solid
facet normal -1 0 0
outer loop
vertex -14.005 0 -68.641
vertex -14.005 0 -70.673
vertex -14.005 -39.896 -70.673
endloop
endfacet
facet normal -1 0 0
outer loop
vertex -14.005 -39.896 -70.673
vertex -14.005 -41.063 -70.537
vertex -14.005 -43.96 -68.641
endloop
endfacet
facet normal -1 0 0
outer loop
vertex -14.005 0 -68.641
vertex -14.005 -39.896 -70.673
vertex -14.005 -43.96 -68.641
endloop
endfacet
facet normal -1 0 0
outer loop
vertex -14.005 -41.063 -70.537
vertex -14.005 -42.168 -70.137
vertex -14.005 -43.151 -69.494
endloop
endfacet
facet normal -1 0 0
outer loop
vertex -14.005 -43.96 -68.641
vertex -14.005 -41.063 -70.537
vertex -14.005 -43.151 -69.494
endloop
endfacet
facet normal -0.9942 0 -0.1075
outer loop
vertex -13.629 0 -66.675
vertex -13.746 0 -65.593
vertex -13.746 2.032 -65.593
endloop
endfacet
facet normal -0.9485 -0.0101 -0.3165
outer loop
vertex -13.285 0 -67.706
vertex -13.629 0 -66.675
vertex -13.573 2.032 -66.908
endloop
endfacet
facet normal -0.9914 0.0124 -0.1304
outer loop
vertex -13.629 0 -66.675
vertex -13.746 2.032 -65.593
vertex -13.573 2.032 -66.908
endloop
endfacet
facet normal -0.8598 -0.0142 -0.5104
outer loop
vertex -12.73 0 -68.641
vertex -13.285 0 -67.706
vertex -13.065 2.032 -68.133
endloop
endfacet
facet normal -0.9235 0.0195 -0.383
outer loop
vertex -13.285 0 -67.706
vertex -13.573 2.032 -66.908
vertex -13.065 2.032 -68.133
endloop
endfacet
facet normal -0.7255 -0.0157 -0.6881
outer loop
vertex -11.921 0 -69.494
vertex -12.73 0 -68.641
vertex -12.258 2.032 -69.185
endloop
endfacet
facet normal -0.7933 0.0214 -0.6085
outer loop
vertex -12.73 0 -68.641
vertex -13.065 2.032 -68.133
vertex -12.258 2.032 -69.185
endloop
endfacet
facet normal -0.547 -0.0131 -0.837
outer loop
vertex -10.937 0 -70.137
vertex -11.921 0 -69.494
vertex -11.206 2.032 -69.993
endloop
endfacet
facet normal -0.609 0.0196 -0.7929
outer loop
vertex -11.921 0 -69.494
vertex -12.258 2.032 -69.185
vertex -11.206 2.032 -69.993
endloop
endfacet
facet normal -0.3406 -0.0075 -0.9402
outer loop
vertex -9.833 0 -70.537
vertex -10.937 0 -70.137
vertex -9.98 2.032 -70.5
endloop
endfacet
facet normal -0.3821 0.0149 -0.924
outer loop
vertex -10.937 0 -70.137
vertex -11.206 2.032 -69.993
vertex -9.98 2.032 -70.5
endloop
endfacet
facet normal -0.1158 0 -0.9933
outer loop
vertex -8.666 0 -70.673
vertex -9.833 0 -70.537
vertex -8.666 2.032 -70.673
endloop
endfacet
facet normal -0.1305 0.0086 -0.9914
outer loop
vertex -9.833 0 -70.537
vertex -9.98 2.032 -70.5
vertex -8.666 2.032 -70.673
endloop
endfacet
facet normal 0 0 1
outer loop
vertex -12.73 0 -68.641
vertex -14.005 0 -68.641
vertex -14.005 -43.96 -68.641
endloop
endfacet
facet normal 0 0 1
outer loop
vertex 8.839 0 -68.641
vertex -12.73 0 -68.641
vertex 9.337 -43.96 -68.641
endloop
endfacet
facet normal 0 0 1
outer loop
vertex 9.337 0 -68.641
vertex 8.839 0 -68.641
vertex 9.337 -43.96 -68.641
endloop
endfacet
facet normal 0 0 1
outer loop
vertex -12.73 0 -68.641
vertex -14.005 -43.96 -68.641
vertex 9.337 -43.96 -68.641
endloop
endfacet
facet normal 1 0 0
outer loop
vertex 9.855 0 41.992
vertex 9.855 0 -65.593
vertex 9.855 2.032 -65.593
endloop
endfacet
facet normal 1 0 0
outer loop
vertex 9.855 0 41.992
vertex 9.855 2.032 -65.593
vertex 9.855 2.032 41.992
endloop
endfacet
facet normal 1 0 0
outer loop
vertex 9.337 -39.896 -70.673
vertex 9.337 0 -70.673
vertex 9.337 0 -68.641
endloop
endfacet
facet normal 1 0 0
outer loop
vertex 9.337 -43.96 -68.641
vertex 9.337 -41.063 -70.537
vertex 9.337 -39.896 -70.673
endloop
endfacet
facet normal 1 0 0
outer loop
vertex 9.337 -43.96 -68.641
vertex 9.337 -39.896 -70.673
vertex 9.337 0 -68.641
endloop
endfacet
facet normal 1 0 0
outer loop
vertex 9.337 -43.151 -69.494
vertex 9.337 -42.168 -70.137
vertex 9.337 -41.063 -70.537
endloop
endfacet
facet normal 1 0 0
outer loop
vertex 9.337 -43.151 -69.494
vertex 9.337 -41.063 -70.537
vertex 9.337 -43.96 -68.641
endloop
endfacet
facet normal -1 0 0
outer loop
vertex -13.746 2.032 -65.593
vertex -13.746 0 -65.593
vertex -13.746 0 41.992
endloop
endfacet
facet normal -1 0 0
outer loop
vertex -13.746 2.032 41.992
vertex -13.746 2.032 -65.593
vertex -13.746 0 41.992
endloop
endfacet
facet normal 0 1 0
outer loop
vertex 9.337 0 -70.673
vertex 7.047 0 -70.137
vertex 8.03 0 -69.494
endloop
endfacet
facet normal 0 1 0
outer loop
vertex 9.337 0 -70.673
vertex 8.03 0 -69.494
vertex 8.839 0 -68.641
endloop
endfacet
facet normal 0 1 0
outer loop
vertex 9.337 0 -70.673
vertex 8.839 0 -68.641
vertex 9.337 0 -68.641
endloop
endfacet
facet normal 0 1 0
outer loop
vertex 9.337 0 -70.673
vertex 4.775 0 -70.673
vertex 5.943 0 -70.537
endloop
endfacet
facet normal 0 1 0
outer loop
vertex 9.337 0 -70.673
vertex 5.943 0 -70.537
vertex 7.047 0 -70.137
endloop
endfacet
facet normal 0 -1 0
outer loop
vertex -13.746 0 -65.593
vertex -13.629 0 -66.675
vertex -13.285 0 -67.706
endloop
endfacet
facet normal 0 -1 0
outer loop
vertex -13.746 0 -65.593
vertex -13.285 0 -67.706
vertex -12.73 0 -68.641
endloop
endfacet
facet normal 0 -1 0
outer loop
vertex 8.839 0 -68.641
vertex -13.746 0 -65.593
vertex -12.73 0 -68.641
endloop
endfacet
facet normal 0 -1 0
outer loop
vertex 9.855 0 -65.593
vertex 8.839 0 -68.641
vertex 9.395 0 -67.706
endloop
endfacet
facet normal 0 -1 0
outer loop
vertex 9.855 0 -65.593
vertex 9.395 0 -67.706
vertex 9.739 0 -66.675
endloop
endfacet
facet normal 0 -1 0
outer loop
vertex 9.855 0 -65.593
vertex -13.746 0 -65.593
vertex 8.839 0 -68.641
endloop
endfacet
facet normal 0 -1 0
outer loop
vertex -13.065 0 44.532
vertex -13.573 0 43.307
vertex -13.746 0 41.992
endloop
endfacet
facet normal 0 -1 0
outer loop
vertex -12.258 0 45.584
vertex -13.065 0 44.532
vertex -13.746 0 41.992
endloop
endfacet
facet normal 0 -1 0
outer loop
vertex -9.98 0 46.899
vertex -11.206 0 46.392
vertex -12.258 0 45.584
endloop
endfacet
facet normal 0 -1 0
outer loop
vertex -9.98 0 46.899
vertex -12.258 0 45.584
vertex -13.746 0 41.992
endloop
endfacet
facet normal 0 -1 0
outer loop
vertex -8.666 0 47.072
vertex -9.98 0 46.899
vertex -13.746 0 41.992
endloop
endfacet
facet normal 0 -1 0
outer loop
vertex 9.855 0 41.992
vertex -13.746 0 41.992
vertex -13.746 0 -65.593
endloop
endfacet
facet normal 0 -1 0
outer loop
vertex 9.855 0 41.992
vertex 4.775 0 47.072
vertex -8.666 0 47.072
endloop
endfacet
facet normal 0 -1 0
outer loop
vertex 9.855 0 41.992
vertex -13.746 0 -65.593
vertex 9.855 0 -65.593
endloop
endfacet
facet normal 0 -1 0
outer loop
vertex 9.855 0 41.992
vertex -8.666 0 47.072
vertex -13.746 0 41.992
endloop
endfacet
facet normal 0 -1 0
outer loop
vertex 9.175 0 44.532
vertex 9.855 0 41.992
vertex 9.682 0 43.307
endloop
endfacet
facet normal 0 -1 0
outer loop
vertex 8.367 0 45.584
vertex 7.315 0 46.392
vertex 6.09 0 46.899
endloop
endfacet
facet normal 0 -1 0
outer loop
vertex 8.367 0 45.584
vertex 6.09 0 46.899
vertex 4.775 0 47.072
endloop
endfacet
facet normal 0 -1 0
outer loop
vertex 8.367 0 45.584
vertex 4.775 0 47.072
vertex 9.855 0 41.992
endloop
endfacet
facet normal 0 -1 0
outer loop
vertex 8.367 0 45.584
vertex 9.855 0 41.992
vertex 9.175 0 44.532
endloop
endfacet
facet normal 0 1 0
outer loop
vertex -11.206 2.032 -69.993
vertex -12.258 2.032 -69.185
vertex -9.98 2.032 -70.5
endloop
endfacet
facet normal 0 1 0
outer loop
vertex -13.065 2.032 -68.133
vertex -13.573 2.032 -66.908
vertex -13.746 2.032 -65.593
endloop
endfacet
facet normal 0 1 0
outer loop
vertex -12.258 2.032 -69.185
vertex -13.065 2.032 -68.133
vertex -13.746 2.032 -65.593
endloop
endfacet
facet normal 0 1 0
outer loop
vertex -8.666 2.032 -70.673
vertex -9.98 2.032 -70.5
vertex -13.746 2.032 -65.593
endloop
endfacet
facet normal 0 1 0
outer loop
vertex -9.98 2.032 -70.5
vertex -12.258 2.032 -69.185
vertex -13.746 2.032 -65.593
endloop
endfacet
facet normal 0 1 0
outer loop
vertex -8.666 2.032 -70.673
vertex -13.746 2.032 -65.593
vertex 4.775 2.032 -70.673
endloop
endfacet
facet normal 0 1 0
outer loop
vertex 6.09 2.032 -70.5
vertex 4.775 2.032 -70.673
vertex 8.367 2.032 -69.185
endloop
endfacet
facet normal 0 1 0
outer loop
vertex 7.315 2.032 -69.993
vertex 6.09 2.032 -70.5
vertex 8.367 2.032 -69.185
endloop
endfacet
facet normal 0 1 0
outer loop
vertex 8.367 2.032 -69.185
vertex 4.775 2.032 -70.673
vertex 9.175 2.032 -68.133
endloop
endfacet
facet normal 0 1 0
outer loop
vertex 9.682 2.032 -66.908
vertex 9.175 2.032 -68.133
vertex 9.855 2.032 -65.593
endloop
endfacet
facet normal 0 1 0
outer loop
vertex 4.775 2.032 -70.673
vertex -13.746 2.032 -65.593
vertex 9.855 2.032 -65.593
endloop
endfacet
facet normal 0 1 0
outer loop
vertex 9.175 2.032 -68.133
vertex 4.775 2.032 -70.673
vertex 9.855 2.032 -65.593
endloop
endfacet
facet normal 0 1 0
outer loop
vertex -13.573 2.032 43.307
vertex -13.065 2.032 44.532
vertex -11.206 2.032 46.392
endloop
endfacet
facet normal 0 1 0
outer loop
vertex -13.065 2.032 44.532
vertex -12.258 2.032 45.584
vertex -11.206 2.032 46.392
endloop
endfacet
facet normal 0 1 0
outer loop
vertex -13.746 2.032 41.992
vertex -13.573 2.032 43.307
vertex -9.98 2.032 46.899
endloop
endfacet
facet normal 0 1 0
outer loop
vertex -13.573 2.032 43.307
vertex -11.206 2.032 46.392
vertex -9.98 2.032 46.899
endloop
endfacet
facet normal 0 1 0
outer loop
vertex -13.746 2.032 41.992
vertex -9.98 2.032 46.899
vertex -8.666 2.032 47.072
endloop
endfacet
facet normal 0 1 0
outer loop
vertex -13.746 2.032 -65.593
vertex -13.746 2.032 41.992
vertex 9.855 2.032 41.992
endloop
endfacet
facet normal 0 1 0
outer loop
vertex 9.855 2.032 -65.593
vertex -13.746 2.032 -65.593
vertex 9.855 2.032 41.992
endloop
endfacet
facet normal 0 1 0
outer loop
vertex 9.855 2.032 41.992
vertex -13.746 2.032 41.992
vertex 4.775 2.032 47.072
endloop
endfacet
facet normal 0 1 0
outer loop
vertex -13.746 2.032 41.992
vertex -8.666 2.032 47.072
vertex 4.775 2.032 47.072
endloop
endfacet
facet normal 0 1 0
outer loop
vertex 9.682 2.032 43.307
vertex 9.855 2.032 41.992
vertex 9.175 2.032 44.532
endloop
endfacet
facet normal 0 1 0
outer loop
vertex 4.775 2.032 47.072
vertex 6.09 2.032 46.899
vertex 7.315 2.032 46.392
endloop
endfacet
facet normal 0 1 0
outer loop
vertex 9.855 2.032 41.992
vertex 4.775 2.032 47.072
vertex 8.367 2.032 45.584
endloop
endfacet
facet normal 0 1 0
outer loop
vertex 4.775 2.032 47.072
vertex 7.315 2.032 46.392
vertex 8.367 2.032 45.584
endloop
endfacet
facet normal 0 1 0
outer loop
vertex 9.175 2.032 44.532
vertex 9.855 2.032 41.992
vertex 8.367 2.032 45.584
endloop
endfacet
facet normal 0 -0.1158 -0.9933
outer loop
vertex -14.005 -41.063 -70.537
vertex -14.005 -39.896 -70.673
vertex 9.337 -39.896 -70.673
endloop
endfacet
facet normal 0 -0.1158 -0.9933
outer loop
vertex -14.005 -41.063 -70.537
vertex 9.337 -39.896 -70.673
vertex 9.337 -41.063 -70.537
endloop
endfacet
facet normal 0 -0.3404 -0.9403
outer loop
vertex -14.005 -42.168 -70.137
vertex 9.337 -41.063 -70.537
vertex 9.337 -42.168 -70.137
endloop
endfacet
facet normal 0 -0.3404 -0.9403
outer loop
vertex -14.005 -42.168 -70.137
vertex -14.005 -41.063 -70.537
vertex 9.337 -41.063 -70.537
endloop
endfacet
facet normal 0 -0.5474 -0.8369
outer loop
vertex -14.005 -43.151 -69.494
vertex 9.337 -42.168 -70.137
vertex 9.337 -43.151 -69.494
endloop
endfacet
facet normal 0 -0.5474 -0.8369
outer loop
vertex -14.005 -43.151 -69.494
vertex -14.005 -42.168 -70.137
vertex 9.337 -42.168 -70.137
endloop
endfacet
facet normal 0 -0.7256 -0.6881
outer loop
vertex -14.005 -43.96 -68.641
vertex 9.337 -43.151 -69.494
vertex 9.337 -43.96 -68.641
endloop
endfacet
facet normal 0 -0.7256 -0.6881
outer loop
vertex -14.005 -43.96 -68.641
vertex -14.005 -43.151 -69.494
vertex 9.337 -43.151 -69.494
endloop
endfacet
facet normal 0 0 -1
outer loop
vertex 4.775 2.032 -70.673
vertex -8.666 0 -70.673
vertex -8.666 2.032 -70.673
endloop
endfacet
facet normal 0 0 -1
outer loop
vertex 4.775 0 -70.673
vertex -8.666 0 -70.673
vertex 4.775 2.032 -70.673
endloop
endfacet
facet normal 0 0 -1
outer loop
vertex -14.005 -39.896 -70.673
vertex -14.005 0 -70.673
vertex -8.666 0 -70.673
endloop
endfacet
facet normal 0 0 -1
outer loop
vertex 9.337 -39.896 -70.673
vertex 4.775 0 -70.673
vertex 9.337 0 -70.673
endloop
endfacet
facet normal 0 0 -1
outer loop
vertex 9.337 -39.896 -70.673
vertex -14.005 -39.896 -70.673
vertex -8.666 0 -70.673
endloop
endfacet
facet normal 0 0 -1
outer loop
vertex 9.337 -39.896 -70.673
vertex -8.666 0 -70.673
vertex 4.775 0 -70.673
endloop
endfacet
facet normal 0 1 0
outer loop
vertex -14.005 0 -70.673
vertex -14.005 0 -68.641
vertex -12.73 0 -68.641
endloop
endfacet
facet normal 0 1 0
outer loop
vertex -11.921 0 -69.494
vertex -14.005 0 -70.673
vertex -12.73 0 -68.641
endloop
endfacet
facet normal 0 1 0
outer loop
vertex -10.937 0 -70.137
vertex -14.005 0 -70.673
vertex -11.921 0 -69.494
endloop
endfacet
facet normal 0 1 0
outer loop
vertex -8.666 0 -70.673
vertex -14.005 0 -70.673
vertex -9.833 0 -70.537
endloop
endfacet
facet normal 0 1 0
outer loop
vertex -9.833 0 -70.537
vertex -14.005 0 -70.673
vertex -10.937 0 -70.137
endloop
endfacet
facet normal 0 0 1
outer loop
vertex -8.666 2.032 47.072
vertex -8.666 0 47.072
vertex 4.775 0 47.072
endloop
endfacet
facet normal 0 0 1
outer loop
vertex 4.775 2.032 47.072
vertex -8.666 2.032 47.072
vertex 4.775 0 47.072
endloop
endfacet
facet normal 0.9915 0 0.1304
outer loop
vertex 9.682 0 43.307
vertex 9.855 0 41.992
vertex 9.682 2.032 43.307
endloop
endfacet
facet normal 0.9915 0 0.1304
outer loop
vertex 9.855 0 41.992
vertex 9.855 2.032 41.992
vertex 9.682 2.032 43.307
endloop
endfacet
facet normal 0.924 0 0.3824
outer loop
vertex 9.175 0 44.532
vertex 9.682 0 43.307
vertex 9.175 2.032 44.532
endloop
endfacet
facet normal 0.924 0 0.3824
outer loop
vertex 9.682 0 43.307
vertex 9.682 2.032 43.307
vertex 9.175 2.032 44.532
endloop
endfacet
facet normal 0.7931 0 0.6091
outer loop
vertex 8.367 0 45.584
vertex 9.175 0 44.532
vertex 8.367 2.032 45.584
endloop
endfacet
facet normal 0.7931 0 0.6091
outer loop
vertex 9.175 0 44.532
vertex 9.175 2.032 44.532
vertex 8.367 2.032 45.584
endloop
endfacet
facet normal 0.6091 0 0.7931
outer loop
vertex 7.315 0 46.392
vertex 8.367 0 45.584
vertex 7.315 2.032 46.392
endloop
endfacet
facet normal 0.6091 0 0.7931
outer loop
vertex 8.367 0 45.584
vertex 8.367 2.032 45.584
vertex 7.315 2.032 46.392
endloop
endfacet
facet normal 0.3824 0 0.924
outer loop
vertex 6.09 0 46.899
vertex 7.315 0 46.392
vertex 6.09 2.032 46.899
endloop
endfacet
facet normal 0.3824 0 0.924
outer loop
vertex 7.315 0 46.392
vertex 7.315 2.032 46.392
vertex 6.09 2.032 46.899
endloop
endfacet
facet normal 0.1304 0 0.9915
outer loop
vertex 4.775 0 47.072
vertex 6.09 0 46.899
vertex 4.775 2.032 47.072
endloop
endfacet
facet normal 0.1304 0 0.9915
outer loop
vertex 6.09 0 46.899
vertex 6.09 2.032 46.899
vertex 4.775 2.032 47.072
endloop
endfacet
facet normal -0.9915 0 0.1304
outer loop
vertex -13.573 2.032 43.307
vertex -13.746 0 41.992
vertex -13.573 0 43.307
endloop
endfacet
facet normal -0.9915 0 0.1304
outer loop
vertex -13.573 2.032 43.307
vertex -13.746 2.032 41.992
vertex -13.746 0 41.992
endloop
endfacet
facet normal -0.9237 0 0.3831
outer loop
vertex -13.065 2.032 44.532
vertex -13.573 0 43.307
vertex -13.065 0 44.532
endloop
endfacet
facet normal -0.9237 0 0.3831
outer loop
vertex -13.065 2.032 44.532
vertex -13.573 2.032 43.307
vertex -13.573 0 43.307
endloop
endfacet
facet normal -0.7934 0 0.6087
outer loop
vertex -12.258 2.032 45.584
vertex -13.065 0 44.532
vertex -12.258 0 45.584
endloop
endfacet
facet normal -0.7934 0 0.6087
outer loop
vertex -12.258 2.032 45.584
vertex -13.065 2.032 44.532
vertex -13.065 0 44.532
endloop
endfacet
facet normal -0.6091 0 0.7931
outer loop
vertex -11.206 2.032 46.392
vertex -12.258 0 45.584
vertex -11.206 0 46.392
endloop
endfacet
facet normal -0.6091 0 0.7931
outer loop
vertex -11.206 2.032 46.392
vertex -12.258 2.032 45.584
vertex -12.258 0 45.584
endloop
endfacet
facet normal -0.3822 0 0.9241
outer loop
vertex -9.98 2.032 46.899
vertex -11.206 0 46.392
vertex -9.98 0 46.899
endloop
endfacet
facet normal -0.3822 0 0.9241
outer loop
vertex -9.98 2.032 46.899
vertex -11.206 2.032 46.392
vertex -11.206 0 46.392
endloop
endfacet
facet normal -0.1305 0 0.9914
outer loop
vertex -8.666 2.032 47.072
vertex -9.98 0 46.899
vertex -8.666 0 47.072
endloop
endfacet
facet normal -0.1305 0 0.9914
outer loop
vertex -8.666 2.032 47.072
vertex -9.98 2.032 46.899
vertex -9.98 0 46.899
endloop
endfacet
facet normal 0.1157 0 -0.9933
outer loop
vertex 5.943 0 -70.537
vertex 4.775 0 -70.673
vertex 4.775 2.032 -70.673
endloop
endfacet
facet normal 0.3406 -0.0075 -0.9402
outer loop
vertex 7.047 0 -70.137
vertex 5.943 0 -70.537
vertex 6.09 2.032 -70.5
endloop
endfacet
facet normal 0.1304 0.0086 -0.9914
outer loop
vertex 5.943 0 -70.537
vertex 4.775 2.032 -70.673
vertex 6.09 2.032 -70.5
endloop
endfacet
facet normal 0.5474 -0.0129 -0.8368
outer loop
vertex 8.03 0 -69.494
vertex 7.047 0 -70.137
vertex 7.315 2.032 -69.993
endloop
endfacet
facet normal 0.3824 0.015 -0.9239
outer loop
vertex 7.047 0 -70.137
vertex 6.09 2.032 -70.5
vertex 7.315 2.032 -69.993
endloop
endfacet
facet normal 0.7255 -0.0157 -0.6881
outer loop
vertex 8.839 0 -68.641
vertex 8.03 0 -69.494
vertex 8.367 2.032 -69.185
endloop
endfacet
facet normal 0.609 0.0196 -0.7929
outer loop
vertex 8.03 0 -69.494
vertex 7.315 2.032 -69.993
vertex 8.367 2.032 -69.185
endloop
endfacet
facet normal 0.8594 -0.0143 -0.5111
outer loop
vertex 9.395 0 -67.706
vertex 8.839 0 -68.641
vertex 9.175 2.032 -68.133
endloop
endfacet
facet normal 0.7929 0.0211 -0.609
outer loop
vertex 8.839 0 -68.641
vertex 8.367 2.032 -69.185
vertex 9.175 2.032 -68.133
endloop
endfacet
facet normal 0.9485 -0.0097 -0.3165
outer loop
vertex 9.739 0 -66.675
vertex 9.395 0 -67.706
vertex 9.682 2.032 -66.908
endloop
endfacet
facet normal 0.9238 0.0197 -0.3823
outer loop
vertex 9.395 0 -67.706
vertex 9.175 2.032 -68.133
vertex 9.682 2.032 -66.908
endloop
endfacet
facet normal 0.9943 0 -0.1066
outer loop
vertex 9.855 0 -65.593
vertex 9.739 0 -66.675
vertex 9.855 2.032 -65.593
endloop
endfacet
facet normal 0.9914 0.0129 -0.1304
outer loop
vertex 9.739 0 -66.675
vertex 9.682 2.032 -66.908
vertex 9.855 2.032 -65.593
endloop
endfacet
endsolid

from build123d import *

# Parameters (mm, degrees)
F0_W        = 23.6010048538
F0_H        = 117.7456714213
F1_DEPTH    = 2.032
F2_R        = 5.08
F3_W        = 23.3416529372
F3_H        = 43.9601168036
F4_DEPTH    = 2.032
F5_T1_DEPTH = 43.6616529372


# Not quite as in the source:
# - a fillet or chamfer that OpenCascade refuses, or shapes differently, is made with other operations: its cross-section is extruded or revolved along the edge and cut away or added


with BuildPart() as f1:
    # F0 (on Front) → F1 (new body)
    with BuildSketch(Plane.XZ):
        with Locations((-1.9451379776, -11.8005033582)):
            Rectangle(F0_W, F0_H)
    extrude(amount=-F1_DEPTH)

    # F2
    f2_edges = [f1.edges().sort_by_distance(p)[0] for p in [
        (-13.74564, 1.016, 47.072332),
        (9.855364, 1.016, 47.072332),
        (9.855364, 1.016, -70.673339),
        (-13.74564, 1.016, -70.673339),
    ]]
    fillet(f2_edges, radius=F2_R)

    # F3 (on face) → F4 (join)
    with BuildSketch(Plane(origin=(0, 0, -70.6733390689), x_dir=(1, 0, 0), z_dir=(0, 0, -1))):
        with Locations((-2.3341649212, 21.9800584018)):
            Rectangle(F3_W, F3_H)
    extrude(amount=-F4_DEPTH)

    # F5: fillet of radius 5.08 on 1 edges, made by hand

    # F5_s2 → F5_t1 (cut)
    with BuildSketch(Plane.YZ.offset(-24.1649913898)):
        with BuildLine():
            ThreePointArc((-39.8961168036, -70.6733390689), (-42.1679618688, -70.1370291992), (-43.9601168036, -68.6413390689))
            Line((-43.9601168036, -68.6413390689), (-43.9601168036, -70.6733390689))
            Line((-43.9601168036, -70.6733390689), (-39.8961168036, -70.6733390689))
        make_face()
    extrude(amount=F5_T1_DEPTH, mode=Mode.SUBTRACT)


solid = f1.part
